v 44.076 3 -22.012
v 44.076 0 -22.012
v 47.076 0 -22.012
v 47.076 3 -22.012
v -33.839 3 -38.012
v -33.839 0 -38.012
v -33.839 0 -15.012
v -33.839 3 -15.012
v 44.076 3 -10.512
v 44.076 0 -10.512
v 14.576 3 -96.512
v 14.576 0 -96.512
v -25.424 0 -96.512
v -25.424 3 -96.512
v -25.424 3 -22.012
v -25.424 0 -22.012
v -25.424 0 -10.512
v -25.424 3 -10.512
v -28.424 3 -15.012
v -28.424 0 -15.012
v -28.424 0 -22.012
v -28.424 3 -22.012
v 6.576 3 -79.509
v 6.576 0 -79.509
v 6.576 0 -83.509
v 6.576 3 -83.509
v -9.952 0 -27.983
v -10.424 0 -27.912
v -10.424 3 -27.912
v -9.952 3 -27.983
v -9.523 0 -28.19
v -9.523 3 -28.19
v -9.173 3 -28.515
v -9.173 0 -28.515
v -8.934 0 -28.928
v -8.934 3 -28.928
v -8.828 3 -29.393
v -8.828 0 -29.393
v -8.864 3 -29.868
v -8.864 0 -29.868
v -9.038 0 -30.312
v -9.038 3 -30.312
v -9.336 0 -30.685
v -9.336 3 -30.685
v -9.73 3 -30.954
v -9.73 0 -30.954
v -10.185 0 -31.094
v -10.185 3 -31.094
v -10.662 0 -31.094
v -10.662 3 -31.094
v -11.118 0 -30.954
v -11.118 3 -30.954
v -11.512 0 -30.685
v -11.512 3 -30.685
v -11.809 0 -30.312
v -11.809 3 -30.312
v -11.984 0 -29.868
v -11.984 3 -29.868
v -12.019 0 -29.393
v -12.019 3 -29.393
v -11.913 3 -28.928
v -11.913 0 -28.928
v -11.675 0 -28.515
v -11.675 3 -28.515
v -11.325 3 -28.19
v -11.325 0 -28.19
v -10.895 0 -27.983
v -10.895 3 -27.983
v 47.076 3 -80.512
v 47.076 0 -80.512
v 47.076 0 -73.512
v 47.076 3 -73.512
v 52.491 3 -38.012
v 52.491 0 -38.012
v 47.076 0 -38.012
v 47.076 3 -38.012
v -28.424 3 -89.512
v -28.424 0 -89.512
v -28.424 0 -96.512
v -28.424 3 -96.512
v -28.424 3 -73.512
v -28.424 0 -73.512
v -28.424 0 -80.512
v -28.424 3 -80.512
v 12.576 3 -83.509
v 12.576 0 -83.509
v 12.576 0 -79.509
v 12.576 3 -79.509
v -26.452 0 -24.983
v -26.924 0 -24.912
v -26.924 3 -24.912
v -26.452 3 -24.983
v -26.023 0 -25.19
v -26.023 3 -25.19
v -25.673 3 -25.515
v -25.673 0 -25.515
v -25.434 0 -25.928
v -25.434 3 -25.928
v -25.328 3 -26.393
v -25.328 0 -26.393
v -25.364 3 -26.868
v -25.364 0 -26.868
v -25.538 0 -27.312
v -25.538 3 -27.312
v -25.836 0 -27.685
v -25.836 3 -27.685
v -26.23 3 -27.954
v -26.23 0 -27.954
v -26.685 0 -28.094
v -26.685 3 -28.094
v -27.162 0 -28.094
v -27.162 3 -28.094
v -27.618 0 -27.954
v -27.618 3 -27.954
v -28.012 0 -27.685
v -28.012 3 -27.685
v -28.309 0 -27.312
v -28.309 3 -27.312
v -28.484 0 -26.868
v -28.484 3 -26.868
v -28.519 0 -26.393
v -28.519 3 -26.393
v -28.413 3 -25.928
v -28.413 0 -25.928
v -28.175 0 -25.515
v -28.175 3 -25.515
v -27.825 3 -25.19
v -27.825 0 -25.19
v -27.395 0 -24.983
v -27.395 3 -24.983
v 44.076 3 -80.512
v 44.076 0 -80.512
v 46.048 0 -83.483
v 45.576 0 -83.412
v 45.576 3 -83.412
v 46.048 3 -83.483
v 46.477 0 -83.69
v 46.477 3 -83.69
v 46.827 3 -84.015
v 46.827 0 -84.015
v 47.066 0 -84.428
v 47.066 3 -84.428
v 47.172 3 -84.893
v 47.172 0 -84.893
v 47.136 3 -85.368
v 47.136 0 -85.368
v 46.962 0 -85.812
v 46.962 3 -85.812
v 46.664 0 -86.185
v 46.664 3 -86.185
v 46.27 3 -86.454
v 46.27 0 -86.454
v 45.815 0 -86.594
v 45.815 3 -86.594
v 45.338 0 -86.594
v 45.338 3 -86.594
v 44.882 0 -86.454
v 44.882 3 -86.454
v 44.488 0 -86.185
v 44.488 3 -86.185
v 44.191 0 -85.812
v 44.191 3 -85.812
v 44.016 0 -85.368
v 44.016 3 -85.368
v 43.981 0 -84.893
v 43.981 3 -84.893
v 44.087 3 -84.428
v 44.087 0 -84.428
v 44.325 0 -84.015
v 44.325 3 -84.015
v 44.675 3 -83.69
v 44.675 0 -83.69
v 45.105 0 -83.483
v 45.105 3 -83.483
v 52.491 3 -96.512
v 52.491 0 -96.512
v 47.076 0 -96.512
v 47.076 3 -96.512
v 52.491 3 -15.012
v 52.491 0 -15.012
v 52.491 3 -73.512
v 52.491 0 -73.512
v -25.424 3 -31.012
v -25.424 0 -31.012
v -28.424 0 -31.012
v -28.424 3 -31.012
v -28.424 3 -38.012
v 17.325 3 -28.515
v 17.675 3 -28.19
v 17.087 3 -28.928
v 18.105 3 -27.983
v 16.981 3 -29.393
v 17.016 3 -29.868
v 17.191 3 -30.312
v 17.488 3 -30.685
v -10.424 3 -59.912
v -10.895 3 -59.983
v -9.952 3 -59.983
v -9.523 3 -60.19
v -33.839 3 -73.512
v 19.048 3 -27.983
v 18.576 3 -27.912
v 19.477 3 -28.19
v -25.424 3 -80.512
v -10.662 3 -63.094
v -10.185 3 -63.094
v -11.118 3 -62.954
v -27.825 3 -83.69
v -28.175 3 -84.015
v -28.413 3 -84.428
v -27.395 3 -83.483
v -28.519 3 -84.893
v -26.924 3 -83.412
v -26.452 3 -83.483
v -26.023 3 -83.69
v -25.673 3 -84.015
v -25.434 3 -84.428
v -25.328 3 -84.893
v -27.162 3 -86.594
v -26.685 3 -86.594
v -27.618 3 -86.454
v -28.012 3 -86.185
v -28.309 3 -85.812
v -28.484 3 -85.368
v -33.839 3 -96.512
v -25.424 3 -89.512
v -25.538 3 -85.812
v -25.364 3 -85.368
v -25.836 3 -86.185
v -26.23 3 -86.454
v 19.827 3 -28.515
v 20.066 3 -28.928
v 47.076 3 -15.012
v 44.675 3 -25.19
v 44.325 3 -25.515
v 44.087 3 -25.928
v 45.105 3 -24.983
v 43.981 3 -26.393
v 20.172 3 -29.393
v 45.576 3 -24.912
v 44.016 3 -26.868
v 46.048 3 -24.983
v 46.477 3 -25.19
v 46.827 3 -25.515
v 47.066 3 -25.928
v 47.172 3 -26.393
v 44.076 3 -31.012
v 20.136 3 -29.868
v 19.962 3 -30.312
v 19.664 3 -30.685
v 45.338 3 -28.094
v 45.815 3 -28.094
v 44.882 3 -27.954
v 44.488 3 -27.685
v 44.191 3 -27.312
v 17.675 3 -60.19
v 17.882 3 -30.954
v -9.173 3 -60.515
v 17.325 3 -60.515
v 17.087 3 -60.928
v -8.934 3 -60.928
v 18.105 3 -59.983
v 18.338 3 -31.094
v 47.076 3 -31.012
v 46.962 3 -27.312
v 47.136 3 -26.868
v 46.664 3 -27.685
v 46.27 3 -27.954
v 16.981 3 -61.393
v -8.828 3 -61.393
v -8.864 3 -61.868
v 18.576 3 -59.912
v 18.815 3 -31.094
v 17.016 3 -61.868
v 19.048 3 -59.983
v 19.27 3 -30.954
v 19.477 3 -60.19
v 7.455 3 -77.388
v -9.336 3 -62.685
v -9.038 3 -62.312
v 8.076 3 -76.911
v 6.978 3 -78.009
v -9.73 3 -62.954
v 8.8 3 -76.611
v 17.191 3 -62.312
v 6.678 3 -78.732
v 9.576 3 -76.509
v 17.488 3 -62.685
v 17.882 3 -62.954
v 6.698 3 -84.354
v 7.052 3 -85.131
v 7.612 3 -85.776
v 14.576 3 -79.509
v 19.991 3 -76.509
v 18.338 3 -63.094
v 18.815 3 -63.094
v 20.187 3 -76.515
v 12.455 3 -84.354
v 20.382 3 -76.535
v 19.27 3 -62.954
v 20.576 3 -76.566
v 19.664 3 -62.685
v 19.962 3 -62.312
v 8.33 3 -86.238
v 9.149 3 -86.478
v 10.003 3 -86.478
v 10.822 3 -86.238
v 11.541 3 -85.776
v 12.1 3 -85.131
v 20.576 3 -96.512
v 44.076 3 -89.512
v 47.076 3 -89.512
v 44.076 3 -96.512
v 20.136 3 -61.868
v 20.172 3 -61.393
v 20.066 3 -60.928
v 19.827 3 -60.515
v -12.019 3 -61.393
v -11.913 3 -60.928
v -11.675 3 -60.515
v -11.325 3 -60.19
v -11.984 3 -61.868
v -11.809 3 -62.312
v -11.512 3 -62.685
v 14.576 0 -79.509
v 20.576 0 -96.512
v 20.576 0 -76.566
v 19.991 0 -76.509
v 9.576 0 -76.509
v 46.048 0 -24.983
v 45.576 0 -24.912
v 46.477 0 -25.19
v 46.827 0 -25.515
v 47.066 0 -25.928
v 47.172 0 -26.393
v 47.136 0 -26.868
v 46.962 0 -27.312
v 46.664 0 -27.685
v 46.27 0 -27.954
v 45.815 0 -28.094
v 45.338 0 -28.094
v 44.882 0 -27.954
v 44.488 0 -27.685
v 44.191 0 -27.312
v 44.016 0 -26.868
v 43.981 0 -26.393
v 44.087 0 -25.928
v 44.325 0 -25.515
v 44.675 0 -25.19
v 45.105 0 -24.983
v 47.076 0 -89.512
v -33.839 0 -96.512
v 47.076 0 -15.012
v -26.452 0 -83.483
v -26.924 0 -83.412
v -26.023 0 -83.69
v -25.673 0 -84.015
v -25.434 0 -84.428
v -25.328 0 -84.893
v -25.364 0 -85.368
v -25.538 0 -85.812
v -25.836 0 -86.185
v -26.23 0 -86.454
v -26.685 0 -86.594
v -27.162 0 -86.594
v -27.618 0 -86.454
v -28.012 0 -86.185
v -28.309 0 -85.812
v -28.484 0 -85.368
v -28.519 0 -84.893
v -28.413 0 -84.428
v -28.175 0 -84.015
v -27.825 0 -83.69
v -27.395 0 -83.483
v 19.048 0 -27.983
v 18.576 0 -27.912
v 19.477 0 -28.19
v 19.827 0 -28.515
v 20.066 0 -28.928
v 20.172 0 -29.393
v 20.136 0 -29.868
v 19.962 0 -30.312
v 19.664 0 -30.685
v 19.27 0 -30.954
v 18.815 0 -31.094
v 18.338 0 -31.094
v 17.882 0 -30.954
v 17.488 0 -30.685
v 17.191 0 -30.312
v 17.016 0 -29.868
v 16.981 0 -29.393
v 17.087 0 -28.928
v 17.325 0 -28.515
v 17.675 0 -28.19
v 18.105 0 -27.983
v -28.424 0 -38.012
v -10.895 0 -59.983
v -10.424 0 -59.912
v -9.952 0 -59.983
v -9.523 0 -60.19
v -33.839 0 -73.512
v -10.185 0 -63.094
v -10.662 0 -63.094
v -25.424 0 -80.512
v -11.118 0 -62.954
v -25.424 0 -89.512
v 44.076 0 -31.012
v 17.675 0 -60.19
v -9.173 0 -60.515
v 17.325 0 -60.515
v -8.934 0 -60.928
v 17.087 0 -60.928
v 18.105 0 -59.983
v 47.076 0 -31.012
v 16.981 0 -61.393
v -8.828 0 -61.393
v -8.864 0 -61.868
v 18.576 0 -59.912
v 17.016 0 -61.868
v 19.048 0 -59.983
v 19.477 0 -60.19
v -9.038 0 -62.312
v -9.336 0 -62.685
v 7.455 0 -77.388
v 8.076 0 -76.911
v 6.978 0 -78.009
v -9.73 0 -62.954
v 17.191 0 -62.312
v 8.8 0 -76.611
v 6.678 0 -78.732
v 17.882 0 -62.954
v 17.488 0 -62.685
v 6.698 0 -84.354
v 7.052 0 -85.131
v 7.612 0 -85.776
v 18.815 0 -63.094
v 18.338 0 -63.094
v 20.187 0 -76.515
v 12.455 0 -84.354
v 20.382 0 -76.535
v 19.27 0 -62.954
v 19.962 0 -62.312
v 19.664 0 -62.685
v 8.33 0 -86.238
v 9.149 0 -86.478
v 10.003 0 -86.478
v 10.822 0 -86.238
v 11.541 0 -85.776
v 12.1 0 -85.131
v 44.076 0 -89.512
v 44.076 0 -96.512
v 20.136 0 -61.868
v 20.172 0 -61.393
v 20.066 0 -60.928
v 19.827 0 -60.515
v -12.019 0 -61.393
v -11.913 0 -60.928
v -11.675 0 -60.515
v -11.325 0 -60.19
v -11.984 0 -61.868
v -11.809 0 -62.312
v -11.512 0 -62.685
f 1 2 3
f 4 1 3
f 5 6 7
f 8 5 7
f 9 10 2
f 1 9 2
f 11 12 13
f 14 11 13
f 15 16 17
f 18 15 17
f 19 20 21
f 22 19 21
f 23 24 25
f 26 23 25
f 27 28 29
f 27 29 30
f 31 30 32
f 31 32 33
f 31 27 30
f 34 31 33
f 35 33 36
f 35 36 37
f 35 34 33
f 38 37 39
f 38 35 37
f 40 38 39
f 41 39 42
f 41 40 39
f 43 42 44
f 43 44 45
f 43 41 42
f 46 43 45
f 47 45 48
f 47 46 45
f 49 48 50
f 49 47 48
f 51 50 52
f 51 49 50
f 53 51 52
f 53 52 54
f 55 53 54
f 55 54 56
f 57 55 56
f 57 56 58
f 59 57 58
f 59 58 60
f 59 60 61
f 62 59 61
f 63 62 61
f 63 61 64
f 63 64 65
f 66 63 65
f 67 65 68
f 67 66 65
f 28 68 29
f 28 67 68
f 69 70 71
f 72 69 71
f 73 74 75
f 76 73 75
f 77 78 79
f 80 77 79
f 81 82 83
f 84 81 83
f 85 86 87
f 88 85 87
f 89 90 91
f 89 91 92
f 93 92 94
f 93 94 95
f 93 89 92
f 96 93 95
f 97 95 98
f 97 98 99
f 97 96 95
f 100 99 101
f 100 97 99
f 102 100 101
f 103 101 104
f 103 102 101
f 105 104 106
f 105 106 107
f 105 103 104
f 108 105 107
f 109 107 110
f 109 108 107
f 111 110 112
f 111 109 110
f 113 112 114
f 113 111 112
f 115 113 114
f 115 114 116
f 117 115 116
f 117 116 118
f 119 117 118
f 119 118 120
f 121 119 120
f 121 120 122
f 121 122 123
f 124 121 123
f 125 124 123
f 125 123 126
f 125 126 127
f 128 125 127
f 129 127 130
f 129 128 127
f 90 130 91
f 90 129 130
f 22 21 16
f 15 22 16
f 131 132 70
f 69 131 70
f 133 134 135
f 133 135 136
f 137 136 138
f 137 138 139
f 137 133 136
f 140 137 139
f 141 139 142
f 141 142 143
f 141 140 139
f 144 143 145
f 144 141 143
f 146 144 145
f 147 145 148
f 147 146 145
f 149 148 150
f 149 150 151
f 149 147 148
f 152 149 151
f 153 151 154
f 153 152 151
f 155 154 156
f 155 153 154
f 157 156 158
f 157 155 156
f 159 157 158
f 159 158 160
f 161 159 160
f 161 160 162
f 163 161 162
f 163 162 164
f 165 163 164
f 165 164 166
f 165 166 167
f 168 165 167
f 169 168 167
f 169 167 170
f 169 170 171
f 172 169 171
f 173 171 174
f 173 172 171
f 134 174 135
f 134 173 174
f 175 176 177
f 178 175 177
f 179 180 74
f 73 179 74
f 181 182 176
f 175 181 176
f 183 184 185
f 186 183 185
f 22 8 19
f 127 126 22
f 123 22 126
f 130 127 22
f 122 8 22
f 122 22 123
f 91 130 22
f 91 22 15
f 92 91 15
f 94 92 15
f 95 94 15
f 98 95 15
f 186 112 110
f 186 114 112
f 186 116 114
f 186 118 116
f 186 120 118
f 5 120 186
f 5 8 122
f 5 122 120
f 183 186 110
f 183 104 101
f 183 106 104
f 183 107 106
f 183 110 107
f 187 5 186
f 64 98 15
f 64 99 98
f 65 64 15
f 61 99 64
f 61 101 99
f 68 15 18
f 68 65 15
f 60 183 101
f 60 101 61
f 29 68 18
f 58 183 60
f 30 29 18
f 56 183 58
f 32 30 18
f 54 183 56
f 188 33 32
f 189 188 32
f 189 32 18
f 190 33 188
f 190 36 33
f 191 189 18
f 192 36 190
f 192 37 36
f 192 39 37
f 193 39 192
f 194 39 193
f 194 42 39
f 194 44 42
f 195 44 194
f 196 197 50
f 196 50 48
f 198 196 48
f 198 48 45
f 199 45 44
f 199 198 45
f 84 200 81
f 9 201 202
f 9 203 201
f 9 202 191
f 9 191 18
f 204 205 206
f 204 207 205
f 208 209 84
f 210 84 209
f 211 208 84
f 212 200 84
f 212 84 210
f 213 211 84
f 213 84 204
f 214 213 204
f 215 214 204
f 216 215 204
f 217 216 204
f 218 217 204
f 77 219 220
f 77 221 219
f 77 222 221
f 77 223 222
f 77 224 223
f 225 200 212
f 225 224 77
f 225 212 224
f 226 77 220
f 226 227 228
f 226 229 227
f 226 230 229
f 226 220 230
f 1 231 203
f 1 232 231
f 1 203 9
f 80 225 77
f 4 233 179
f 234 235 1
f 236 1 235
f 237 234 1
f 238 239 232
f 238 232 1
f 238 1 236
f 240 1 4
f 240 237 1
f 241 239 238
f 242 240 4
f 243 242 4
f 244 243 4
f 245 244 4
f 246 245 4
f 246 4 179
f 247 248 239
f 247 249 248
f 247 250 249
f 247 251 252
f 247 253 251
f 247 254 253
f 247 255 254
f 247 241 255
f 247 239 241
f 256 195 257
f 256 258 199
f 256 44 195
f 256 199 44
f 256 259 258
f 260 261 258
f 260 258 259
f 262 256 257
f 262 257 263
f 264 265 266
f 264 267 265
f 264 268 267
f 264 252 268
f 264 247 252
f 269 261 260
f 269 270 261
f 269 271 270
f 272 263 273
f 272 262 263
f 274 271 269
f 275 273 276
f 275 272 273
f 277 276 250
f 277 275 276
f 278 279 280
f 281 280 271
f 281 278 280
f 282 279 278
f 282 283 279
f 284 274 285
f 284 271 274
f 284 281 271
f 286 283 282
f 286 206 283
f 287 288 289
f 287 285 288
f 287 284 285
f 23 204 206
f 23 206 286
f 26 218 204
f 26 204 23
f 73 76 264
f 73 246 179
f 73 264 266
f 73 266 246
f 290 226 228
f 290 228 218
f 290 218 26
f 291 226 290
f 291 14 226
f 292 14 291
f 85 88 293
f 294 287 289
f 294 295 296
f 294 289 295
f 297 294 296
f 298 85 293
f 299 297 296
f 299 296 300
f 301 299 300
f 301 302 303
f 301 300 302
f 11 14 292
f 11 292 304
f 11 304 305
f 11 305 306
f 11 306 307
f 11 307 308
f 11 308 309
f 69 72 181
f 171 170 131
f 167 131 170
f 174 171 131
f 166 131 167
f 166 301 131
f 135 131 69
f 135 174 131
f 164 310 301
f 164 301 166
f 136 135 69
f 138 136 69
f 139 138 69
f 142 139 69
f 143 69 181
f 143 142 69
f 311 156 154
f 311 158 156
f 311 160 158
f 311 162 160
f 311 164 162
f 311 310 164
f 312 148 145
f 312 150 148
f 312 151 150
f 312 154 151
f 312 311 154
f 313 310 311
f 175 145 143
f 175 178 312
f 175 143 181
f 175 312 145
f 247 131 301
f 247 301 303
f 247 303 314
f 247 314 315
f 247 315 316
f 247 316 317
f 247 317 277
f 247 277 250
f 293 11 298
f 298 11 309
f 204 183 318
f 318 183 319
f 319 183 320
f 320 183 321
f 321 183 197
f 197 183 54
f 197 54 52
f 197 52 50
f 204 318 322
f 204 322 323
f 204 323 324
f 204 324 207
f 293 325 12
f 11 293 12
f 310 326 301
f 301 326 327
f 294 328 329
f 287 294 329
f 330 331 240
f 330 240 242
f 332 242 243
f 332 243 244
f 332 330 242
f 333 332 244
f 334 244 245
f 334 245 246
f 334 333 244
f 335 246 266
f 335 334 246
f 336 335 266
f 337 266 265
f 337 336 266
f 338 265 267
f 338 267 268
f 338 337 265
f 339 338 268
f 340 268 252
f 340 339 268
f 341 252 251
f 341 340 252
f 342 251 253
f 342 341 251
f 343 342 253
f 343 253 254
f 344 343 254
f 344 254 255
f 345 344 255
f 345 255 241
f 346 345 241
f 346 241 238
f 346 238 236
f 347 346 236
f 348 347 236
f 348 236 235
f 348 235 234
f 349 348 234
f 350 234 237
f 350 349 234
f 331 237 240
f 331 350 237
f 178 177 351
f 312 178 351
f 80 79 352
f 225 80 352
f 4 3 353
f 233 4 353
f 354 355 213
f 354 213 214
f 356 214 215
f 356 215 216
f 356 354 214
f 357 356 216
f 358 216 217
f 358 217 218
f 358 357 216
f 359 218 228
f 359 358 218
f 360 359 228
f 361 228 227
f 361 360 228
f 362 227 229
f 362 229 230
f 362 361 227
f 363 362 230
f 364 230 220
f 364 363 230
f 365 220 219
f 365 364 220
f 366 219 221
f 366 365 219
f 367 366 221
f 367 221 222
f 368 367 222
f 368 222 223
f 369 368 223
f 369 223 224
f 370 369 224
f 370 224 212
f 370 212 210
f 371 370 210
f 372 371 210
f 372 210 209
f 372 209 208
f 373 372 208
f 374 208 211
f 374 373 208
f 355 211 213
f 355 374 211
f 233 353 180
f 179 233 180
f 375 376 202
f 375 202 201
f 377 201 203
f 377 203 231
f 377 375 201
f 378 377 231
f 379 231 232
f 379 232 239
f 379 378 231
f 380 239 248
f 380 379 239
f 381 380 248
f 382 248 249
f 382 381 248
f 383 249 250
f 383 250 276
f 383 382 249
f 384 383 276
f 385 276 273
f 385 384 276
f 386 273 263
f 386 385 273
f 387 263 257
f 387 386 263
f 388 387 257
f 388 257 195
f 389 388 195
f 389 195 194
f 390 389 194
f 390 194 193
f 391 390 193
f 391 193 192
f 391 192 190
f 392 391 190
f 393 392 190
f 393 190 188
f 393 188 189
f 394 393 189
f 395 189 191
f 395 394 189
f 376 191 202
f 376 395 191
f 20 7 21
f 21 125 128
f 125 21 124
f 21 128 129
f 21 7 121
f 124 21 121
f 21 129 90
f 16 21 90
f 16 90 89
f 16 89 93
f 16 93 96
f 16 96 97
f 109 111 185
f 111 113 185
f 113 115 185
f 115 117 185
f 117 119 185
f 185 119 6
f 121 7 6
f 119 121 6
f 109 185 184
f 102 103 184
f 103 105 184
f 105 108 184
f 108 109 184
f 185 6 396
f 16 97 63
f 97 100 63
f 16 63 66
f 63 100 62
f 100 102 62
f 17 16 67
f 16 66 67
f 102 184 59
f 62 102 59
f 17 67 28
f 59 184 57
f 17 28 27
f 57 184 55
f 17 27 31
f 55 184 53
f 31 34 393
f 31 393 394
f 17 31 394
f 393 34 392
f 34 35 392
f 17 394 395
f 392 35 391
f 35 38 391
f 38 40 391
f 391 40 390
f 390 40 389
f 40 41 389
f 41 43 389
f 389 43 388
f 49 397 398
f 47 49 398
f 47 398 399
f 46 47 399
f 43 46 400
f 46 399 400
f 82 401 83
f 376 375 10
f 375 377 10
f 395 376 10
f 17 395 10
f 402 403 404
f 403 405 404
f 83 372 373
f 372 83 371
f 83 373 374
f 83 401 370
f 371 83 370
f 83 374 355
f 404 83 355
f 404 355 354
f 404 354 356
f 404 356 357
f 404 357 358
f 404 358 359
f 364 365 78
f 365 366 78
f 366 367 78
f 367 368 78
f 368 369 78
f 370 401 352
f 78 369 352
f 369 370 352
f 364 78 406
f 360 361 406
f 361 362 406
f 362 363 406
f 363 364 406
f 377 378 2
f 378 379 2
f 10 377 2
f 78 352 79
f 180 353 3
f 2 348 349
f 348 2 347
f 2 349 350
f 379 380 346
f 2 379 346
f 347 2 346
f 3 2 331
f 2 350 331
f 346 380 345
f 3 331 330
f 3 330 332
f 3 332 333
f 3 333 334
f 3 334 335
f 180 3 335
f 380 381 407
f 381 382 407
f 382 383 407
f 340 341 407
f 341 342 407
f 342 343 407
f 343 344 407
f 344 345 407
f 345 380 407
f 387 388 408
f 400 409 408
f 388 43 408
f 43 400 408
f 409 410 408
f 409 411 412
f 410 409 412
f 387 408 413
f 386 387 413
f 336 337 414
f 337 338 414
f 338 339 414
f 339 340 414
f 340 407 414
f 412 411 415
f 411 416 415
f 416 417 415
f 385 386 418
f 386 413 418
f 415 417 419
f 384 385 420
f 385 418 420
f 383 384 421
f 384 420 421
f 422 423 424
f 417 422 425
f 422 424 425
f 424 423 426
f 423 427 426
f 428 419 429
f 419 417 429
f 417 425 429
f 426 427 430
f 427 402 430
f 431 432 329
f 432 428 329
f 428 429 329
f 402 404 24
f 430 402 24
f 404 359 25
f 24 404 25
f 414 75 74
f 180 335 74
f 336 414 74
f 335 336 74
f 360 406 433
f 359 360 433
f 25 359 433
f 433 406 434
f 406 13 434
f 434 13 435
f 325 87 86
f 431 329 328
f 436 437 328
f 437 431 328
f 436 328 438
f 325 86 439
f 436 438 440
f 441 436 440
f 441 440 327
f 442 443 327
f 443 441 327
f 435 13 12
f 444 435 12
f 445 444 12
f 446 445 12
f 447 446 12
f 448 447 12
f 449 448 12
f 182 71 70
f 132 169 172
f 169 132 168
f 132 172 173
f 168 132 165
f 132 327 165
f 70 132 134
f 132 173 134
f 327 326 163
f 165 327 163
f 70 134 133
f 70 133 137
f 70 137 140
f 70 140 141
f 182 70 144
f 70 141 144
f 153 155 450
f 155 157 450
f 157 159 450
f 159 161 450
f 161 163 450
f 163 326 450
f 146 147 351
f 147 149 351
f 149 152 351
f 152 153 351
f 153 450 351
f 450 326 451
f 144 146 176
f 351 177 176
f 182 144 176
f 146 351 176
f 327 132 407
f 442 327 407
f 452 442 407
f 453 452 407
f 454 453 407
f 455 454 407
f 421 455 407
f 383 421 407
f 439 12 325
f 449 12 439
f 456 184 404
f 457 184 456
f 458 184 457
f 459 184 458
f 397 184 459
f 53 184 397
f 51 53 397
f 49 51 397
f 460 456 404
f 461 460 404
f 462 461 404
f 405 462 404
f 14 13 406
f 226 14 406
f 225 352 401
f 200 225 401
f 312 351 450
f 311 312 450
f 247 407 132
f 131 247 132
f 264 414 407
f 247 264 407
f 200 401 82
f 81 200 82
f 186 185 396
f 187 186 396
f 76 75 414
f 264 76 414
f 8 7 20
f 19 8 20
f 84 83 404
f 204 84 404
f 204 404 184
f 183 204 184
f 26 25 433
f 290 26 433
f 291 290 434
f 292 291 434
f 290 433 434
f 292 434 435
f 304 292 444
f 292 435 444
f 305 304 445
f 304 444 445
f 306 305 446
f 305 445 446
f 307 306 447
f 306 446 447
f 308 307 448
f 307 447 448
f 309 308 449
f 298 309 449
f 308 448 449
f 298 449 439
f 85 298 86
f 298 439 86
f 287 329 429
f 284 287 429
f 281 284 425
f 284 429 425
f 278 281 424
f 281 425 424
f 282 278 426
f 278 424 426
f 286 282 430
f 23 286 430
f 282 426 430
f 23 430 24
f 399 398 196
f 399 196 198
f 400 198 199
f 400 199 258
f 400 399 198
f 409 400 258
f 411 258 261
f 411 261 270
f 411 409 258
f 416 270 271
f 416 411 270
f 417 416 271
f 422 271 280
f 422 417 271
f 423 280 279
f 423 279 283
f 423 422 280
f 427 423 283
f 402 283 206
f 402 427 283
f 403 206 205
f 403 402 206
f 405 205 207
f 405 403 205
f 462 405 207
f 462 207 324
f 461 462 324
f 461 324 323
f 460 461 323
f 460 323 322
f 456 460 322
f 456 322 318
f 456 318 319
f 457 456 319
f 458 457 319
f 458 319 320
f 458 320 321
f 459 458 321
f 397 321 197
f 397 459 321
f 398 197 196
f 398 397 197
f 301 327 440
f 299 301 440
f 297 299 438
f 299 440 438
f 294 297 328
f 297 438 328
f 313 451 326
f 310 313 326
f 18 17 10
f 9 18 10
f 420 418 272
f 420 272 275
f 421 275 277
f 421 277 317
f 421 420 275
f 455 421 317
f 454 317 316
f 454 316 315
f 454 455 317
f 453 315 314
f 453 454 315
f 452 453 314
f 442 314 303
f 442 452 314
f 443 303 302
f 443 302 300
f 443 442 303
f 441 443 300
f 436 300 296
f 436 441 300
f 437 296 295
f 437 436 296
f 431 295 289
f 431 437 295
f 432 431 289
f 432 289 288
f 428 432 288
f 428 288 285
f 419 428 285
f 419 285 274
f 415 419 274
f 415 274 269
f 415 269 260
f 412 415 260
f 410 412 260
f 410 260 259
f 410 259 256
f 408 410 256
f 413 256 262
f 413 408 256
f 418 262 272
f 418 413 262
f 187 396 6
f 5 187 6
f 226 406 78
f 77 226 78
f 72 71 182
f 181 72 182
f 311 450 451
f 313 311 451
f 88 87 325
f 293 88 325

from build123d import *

# Parameters (mm, degrees)
SKETCH_1_R      = 1.6
EXTRUDE_1_DEPTH = 3


with BuildPart() as part:
    # 草图1 → 凸台-拉伸1 (new body)
    with BuildSketch(Plane(origin=(0, 0, 0), x_dir=(1, 0, 0), z_dir=(0, 1, 0))):
        with BuildLine():
            Line((-25.423831263, 10.512307079), (44.076168737, 10.512307079))
            Line((44.076168737, 10.512307079), (44.076168737, 22.012307079))
            Line((44.076168737, 22.012307079), (47.076168737, 22.012307079))
            Line((47.076168737, 22.012307079), (47.076168737, 15.012307079))
            Line((47.076168737, 15.012307079), (52.490895584, 15.012307079))
            Line((52.490895584, 15.012307079), (52.490895584, 38.012307079))
            Line((52.490895584, 38.012307079), (47.076168737, 38.012307079))
            Line((47.076168737, 38.012307079), (47.076168737, 31.012307079))
            Line((47.076168737, 31.012307079), (44.076168737, 31.012307079))
            Line((44.076168737, 31.012307079), (44.076168737, 80.512307079))
            Line((44.076168737, 80.512307079), (47.076168737, 80.512307079))
            Line((47.076168737, 80.512307079), (47.076168737, 73.512307079))
            Line((47.076168737, 73.512307079), (52.490895584, 73.512307079))
            Line((52.490895584, 73.512307079), (52.490895584, 96.512307079))
            Line((52.490895584, 96.512307079), (47.076168737, 96.512307079))
            Line((47.076168737, 96.512307079), (47.076168737, 89.512307079))
            Line((47.076168737, 89.512307079), (44.076168737, 89.512307079))
            Line((44.076168737, 89.512307079), (44.076168737, 96.512307079))
            Line((44.076168737, 96.512307079), (20.576168737, 96.512307079))
            Line((20.576168737, 96.512307079), (20.576168737, 76.566499541))
            ThreePointArc((20.576168737, 76.566499541), (20.284948115, 76.523300877), (19.990895584, 76.508854947))
            Line((19.990895584, 76.508854947), (9.576168737, 76.508854947))
            ThreePointArc((9.576168737, 76.508854947), (7.454848394, 77.387534604), (6.576168737, 79.508854947))
            Line((6.576168737, 79.508854947), (6.576168737, 83.508854947))
            ThreePointArc((6.576168737, 83.508854947), (9.576168737, 86.508854947), (12.576168737, 83.508854947))
            Line((12.576168737, 83.508854947), (12.576168737, 79.508854947))
            Line((12.576168737, 79.508854947), (14.576168737, 79.508854947))
            Line((14.576168737, 79.508854947), (14.576168737, 96.512307079))
            Line((14.576168737, 96.512307079), (-25.423831263, 96.512307079))
            Line((-25.423831263, 96.512307079), (-25.423831263, 89.512307079))
            Line((-25.423831263, 89.512307079), (-28.423831263, 89.512307079))
            Line((-28.423831263, 89.512307079), (-28.423831263, 96.512307079))
            Line((-28.423831263, 96.512307079), (-33.838558109, 96.512307079))
            Line((-33.838558109, 96.512307079), (-33.838558109, 73.512307079))
            Line((-33.838558109, 73.512307079), (-28.423831263, 73.512307079))
            Line((-28.423831263, 73.512307079), (-28.423831263, 80.512307079))
            Line((-28.423831263, 80.512307079), (-25.423831263, 80.512307079))
            Line((-25.423831263, 80.512307079), (-25.423831263, 31.012307079))
            Line((-25.423831263, 31.012307079), (-28.423831263, 31.012307079))
            Line((-28.423831263, 31.012307079), (-28.423831263, 38.012307079))
            Line((-28.423831263, 38.012307079), (-33.838558109, 38.012307079))
            Line((-33.838558109, 38.012307079), (-33.838558109, 15.012307079))
            Line((-33.838558109, 15.012307079), (-28.423831263, 15.012307079))
            Line((-28.423831263, 15.012307079), (-28.423831263, 22.012307079))
            Line((-28.423831263, 22.012307079), (-25.423831263, 22.012307079))
            Line((-25.423831263, 22.012307079), (-25.423831263, 10.512307079))
        make_face()
        with Locations(Location((-10.423831263, 29.512307079, 0), (0, 0, 270))):
            Circle(SKETCH_1_R, mode=Mode.SUBTRACT)
        with Locations(Location((18.576168737, 29.512307079, 0), (0, 0, 270))):
            Circle(SKETCH_1_R, mode=Mode.SUBTRACT)
        with Locations(Location((18.576168737, 61.512307079, 0), (0, 0, 270))):
            Circle(SKETCH_1_R, mode=Mode.SUBTRACT)
        with Locations(Location((-10.423831263, 61.512307079, 0), (0, 0, 270))):
            Circle(SKETCH_1_R, mode=Mode.SUBTRACT)
        with Locations(Location((-26.923831263, 26.512307079, 0), (0, 0, 270))):
            Circle(SKETCH_1_R, mode=Mode.SUBTRACT)
        with Locations(Location((45.576168737, 26.512307079, 0), (0, 0, 270))):
            Circle(SKETCH_1_R, mode=Mode.SUBTRACT)
        with Locations(Location((45.576168737, 85.012307079, 0), (0, 0, 270))):
            Circle(SKETCH_1_R, mode=Mode.SUBTRACT)
        with Locations(Location((-26.923831263, 85.012307079, 0), (0, 0, 270))):
            Circle(SKETCH_1_R, mode=Mode.SUBTRACT)
    extrude(amount=EXTRUDE_1_DEPTH)


solid = part.part
